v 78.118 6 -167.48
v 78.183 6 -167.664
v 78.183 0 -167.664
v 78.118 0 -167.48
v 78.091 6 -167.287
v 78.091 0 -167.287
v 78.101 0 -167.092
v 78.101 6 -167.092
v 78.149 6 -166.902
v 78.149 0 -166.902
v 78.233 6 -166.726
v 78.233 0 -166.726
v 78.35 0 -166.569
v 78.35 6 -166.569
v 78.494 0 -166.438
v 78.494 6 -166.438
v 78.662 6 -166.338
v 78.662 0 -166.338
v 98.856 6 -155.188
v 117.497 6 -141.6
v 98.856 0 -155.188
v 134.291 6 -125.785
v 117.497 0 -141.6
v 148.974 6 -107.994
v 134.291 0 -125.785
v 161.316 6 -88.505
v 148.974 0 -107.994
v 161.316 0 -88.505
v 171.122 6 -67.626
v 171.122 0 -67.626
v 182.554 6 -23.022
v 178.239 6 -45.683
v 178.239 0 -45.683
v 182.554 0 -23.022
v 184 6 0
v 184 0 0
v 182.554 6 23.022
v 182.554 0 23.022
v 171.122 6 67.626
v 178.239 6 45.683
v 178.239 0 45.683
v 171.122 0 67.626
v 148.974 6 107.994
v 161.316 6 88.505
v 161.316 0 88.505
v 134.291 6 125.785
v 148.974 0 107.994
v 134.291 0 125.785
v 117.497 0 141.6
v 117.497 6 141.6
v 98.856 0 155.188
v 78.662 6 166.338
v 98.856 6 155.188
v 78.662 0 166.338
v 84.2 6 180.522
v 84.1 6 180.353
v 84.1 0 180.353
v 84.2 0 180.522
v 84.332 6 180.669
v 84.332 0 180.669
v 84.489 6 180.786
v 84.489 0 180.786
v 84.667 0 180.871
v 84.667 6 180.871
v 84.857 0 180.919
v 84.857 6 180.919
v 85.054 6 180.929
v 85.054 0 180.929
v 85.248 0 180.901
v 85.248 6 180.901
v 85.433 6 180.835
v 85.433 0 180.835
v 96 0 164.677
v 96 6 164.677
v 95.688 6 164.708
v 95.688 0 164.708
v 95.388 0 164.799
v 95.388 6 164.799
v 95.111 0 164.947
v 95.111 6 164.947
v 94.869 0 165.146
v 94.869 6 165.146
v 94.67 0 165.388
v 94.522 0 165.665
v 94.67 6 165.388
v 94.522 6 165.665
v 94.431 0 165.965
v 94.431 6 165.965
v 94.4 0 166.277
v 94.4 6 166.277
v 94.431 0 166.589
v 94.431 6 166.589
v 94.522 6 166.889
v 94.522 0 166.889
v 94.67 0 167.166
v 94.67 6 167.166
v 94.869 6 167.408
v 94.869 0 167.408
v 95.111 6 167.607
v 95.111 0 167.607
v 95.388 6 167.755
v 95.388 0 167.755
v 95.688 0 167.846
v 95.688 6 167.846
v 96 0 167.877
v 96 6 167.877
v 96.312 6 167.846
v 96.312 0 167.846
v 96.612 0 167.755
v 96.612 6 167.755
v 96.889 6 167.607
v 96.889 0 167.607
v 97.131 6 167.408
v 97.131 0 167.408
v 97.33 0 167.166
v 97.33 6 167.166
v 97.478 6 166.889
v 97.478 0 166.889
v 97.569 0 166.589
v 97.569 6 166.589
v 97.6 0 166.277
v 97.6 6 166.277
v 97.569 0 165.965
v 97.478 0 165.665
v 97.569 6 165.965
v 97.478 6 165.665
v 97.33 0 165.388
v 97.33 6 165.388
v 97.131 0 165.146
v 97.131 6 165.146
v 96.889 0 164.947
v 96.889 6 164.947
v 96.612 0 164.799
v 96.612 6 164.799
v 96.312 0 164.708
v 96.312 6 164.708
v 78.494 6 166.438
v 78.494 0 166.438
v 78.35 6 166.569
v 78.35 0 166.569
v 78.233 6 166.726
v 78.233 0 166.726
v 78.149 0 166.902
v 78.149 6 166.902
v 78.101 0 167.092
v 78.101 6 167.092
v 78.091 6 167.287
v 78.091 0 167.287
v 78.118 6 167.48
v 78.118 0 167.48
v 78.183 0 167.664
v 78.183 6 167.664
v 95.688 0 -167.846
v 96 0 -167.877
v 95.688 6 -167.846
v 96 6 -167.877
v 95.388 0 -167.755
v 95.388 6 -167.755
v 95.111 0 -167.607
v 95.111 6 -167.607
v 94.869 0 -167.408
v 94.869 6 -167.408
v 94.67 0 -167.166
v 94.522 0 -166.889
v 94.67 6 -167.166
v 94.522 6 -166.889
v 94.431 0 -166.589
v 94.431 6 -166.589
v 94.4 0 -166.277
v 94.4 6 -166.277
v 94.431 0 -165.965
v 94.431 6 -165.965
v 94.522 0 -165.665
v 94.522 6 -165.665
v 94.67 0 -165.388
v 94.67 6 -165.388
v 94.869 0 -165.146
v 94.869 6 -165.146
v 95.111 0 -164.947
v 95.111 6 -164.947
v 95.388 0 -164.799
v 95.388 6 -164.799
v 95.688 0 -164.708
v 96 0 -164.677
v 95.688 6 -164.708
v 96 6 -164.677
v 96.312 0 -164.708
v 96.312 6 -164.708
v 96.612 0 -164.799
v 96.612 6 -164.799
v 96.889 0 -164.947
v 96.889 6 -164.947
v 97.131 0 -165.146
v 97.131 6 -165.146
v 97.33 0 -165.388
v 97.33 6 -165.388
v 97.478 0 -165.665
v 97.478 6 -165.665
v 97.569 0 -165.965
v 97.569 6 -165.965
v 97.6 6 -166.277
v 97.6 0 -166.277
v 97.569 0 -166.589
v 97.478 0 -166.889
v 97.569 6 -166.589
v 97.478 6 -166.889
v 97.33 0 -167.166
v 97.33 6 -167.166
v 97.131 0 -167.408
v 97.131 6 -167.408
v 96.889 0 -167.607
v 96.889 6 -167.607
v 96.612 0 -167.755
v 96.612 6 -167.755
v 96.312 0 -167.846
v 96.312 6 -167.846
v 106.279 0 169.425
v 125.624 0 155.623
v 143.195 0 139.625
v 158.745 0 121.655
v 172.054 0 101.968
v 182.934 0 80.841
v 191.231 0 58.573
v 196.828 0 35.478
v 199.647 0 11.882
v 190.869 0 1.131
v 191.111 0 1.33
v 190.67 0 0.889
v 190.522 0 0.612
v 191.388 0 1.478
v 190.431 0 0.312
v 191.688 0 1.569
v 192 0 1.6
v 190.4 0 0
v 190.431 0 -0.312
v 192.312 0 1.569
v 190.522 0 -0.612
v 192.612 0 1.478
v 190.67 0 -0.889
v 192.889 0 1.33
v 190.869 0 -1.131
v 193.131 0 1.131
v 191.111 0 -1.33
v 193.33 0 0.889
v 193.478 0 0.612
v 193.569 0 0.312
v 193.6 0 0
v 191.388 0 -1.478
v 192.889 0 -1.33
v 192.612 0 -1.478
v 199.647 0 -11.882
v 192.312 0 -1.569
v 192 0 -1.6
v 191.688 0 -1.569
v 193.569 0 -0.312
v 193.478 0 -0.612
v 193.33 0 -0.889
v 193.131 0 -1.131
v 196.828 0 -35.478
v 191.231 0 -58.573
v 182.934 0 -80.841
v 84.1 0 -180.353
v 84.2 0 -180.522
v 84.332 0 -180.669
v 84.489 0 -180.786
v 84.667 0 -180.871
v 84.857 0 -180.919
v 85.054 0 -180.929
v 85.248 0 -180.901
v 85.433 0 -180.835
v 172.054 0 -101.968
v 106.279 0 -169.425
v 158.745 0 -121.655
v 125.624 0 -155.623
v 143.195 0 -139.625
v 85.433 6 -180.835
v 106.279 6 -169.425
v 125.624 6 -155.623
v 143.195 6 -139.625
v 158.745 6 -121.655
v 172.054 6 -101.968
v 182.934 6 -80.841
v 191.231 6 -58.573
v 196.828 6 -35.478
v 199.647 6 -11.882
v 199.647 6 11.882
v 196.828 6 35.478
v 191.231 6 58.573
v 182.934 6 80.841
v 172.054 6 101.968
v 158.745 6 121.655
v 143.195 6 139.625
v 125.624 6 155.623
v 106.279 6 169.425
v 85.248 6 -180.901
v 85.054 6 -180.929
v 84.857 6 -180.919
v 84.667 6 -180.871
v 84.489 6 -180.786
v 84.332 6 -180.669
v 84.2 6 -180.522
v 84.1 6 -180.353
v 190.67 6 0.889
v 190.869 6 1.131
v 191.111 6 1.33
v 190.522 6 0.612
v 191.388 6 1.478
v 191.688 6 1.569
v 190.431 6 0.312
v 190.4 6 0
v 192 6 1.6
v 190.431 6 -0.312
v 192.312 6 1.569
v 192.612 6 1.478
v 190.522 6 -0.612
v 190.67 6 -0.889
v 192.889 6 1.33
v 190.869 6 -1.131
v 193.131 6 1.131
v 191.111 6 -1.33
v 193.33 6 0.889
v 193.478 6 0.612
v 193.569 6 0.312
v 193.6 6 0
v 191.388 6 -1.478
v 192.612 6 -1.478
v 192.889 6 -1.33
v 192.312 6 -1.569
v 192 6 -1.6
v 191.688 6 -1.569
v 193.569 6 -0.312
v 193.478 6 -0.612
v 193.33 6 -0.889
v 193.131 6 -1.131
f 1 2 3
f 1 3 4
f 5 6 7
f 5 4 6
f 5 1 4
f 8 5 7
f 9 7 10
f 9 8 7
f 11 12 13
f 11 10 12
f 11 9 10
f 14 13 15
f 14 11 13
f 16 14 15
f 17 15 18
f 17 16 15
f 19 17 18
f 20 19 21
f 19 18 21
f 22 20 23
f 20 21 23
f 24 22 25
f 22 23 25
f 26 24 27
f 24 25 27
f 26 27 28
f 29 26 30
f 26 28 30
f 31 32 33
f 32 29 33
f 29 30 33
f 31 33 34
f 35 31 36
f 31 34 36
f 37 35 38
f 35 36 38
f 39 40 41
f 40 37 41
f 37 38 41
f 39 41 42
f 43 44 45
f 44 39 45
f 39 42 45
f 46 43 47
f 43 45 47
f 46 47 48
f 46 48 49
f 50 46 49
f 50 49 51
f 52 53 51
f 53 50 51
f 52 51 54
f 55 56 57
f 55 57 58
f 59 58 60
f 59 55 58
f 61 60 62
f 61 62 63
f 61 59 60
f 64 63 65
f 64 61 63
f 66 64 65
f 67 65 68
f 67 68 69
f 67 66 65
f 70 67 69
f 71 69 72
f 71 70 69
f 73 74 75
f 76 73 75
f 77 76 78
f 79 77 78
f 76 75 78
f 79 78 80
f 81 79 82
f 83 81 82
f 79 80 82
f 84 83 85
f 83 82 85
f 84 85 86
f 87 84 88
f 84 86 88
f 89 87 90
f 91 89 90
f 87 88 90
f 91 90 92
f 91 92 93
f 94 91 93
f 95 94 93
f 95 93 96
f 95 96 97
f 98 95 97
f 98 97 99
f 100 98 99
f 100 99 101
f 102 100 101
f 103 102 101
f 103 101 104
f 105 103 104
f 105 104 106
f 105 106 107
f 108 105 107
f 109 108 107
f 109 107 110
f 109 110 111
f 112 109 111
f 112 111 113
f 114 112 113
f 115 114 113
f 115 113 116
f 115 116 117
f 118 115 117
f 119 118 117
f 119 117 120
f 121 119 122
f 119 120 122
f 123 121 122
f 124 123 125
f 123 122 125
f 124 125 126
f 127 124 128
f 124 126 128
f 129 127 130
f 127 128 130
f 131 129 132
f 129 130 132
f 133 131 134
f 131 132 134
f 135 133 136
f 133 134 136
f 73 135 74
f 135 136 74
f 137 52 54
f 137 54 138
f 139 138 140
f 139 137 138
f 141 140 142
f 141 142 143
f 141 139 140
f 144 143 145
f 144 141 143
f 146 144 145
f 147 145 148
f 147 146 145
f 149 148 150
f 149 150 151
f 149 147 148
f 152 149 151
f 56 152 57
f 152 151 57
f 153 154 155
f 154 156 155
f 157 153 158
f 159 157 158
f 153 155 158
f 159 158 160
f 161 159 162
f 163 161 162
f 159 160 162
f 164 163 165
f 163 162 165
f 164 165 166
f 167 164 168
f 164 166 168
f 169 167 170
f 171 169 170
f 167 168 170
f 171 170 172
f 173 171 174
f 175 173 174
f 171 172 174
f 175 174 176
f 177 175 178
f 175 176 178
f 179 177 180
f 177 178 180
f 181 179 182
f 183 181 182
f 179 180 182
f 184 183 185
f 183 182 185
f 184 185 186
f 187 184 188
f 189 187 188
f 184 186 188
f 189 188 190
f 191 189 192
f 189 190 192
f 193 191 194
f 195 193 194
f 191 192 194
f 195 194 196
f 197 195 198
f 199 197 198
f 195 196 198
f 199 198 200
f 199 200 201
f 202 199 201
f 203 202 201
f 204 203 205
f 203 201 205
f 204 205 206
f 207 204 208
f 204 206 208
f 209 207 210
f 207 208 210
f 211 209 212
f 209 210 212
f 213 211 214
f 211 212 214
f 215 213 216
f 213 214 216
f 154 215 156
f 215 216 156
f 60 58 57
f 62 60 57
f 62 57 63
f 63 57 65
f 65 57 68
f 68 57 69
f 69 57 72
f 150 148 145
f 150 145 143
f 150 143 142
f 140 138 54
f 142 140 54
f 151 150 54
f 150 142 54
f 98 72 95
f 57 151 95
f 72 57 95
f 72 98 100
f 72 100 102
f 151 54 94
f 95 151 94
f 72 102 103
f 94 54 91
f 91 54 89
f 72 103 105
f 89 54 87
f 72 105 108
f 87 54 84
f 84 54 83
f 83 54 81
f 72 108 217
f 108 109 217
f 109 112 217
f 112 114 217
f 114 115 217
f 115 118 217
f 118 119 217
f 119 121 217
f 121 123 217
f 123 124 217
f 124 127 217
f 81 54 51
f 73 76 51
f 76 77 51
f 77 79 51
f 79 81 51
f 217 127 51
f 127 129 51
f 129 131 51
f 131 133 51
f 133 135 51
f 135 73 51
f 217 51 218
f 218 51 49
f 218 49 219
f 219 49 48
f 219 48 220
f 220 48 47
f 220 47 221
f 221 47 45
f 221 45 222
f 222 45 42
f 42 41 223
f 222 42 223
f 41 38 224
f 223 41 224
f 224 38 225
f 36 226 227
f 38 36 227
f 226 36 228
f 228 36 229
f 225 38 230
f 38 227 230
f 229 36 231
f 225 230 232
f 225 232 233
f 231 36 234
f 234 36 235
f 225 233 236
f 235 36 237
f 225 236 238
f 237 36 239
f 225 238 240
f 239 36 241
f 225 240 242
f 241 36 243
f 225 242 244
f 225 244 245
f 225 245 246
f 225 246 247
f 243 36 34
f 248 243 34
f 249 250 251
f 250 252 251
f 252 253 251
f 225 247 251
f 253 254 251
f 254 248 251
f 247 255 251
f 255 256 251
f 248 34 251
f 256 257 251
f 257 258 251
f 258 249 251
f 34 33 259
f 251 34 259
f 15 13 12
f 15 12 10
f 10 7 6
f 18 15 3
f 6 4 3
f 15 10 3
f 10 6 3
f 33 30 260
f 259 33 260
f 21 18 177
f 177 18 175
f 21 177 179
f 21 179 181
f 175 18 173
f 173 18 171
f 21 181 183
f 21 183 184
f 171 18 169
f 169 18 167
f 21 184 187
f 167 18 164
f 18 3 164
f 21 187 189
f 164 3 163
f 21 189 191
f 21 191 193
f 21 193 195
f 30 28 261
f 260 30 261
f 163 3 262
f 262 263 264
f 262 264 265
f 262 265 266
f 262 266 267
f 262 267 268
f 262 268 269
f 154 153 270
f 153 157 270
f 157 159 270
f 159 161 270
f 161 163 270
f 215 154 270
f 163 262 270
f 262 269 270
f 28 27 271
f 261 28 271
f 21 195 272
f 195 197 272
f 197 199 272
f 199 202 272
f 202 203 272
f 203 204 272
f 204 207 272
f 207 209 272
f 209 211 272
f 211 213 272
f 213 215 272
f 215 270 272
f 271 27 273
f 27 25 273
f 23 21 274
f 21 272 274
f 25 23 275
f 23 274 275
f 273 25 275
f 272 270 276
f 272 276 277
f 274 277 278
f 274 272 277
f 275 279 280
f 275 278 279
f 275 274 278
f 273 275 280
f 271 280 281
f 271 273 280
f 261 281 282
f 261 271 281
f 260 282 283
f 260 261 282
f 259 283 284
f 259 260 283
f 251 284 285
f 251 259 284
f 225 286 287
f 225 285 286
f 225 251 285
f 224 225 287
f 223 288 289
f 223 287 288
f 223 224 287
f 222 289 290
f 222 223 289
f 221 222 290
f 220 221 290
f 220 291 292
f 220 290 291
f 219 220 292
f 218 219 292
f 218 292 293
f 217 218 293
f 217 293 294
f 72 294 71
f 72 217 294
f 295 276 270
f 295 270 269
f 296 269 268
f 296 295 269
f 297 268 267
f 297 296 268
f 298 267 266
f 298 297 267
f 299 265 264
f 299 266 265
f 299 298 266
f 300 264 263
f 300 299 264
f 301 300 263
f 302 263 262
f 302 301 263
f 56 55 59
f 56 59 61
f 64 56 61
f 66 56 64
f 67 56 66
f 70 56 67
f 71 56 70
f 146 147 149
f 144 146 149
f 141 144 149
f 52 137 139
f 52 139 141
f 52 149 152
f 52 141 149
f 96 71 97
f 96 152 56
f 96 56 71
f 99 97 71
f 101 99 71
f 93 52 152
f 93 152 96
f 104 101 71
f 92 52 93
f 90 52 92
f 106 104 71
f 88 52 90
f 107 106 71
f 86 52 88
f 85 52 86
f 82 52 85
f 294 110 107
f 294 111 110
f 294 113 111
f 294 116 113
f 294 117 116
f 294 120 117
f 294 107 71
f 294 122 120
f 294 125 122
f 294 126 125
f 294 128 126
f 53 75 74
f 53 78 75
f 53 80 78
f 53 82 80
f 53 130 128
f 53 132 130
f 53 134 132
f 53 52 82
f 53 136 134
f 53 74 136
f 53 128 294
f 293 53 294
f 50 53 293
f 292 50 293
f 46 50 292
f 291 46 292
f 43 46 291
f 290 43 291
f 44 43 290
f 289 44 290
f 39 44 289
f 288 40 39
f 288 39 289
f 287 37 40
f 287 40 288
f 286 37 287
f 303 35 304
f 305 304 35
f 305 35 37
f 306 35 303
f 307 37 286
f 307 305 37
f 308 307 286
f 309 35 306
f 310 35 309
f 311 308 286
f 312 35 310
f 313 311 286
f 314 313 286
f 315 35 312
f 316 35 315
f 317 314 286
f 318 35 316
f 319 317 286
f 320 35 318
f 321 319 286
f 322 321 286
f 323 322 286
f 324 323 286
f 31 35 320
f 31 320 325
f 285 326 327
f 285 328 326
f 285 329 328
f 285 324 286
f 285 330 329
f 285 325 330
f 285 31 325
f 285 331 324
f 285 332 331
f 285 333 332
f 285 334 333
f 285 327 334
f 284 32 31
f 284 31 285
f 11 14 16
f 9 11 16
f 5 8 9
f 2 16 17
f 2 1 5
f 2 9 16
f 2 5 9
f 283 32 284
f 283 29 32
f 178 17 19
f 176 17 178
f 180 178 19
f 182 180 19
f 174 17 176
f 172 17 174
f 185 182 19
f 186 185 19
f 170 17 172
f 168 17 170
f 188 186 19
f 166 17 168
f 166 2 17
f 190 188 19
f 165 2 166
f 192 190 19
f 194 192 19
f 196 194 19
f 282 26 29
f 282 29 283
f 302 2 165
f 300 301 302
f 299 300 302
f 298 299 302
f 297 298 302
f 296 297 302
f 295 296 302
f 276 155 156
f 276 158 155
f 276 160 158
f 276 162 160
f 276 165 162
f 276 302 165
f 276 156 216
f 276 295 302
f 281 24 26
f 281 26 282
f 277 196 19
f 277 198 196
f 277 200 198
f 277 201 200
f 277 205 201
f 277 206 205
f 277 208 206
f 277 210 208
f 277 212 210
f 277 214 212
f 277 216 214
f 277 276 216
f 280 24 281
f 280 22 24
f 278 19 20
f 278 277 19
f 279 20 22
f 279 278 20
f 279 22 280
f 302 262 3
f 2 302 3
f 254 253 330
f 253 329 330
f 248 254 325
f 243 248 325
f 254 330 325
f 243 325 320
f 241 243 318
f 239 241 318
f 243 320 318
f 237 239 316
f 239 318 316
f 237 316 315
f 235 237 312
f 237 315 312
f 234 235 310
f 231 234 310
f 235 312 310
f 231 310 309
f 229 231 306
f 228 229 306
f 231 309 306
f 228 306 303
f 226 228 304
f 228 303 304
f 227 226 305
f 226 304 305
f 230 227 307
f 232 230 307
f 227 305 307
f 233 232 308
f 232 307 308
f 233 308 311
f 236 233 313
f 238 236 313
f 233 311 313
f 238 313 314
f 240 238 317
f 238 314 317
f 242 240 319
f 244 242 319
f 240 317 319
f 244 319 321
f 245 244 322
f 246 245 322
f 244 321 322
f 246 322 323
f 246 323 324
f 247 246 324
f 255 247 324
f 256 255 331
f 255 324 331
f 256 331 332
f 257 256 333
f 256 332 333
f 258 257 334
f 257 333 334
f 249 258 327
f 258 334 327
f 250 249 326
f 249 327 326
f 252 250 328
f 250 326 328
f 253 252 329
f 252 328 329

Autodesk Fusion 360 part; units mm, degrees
sketch "スケッチ1" plane through (0, 0, 0) normal (0, 1, 0) x (1, 0, 0)
  arc A0 (77.7618, -166.7606) -> (77.7618, 166.7606) centre (0, 0) ccw
  arc A1 (84.5237, -181.2616) -> (84.5237, 181.2616) centre (0, 0) ccw
  line L0 (84.5237, 181.2616) -> (0, 0)
  line L1 (0, 0) -> (84.5237, -181.2616)
  arc A2 (96, -166.2769) -> (96, 166.2769) centre (0, 0) ccw
  line L2 (96, 166.2769) -> (0, 0)
  line L3 (96, -166.2769) -> (0, 0)
  line L4 (0, 0) -> (192, 0)
  dimension "d1" = 200
  dimension "d2" = 184
  dimension "d3" = 192
  dimension "d4" = 60
  dimension "d5" = 60
  dimension "d6" = 65
  dimension "d8" = 65
extrude "押し出し1" add sketch "スケッチ1" along normal blind 6 contours A0 A1 L0 L1 A2 L2 L3 | A0 A2 L3 L4 | A0 A2 L2 L4
hole "穴1" at (192, 0, 0) at (96, 0, 166.2769) at (96, 0, -166.2769) direction (0, 1, 0) diameter 3.2 end through all
fillet "フィレット1" radius 1 4 edges at (84.5237, 3, 181.2616) (77.7618, 3, 166.7606) (84.5237, 3, -181.2616) (77.7618, 3, -166.7606)
